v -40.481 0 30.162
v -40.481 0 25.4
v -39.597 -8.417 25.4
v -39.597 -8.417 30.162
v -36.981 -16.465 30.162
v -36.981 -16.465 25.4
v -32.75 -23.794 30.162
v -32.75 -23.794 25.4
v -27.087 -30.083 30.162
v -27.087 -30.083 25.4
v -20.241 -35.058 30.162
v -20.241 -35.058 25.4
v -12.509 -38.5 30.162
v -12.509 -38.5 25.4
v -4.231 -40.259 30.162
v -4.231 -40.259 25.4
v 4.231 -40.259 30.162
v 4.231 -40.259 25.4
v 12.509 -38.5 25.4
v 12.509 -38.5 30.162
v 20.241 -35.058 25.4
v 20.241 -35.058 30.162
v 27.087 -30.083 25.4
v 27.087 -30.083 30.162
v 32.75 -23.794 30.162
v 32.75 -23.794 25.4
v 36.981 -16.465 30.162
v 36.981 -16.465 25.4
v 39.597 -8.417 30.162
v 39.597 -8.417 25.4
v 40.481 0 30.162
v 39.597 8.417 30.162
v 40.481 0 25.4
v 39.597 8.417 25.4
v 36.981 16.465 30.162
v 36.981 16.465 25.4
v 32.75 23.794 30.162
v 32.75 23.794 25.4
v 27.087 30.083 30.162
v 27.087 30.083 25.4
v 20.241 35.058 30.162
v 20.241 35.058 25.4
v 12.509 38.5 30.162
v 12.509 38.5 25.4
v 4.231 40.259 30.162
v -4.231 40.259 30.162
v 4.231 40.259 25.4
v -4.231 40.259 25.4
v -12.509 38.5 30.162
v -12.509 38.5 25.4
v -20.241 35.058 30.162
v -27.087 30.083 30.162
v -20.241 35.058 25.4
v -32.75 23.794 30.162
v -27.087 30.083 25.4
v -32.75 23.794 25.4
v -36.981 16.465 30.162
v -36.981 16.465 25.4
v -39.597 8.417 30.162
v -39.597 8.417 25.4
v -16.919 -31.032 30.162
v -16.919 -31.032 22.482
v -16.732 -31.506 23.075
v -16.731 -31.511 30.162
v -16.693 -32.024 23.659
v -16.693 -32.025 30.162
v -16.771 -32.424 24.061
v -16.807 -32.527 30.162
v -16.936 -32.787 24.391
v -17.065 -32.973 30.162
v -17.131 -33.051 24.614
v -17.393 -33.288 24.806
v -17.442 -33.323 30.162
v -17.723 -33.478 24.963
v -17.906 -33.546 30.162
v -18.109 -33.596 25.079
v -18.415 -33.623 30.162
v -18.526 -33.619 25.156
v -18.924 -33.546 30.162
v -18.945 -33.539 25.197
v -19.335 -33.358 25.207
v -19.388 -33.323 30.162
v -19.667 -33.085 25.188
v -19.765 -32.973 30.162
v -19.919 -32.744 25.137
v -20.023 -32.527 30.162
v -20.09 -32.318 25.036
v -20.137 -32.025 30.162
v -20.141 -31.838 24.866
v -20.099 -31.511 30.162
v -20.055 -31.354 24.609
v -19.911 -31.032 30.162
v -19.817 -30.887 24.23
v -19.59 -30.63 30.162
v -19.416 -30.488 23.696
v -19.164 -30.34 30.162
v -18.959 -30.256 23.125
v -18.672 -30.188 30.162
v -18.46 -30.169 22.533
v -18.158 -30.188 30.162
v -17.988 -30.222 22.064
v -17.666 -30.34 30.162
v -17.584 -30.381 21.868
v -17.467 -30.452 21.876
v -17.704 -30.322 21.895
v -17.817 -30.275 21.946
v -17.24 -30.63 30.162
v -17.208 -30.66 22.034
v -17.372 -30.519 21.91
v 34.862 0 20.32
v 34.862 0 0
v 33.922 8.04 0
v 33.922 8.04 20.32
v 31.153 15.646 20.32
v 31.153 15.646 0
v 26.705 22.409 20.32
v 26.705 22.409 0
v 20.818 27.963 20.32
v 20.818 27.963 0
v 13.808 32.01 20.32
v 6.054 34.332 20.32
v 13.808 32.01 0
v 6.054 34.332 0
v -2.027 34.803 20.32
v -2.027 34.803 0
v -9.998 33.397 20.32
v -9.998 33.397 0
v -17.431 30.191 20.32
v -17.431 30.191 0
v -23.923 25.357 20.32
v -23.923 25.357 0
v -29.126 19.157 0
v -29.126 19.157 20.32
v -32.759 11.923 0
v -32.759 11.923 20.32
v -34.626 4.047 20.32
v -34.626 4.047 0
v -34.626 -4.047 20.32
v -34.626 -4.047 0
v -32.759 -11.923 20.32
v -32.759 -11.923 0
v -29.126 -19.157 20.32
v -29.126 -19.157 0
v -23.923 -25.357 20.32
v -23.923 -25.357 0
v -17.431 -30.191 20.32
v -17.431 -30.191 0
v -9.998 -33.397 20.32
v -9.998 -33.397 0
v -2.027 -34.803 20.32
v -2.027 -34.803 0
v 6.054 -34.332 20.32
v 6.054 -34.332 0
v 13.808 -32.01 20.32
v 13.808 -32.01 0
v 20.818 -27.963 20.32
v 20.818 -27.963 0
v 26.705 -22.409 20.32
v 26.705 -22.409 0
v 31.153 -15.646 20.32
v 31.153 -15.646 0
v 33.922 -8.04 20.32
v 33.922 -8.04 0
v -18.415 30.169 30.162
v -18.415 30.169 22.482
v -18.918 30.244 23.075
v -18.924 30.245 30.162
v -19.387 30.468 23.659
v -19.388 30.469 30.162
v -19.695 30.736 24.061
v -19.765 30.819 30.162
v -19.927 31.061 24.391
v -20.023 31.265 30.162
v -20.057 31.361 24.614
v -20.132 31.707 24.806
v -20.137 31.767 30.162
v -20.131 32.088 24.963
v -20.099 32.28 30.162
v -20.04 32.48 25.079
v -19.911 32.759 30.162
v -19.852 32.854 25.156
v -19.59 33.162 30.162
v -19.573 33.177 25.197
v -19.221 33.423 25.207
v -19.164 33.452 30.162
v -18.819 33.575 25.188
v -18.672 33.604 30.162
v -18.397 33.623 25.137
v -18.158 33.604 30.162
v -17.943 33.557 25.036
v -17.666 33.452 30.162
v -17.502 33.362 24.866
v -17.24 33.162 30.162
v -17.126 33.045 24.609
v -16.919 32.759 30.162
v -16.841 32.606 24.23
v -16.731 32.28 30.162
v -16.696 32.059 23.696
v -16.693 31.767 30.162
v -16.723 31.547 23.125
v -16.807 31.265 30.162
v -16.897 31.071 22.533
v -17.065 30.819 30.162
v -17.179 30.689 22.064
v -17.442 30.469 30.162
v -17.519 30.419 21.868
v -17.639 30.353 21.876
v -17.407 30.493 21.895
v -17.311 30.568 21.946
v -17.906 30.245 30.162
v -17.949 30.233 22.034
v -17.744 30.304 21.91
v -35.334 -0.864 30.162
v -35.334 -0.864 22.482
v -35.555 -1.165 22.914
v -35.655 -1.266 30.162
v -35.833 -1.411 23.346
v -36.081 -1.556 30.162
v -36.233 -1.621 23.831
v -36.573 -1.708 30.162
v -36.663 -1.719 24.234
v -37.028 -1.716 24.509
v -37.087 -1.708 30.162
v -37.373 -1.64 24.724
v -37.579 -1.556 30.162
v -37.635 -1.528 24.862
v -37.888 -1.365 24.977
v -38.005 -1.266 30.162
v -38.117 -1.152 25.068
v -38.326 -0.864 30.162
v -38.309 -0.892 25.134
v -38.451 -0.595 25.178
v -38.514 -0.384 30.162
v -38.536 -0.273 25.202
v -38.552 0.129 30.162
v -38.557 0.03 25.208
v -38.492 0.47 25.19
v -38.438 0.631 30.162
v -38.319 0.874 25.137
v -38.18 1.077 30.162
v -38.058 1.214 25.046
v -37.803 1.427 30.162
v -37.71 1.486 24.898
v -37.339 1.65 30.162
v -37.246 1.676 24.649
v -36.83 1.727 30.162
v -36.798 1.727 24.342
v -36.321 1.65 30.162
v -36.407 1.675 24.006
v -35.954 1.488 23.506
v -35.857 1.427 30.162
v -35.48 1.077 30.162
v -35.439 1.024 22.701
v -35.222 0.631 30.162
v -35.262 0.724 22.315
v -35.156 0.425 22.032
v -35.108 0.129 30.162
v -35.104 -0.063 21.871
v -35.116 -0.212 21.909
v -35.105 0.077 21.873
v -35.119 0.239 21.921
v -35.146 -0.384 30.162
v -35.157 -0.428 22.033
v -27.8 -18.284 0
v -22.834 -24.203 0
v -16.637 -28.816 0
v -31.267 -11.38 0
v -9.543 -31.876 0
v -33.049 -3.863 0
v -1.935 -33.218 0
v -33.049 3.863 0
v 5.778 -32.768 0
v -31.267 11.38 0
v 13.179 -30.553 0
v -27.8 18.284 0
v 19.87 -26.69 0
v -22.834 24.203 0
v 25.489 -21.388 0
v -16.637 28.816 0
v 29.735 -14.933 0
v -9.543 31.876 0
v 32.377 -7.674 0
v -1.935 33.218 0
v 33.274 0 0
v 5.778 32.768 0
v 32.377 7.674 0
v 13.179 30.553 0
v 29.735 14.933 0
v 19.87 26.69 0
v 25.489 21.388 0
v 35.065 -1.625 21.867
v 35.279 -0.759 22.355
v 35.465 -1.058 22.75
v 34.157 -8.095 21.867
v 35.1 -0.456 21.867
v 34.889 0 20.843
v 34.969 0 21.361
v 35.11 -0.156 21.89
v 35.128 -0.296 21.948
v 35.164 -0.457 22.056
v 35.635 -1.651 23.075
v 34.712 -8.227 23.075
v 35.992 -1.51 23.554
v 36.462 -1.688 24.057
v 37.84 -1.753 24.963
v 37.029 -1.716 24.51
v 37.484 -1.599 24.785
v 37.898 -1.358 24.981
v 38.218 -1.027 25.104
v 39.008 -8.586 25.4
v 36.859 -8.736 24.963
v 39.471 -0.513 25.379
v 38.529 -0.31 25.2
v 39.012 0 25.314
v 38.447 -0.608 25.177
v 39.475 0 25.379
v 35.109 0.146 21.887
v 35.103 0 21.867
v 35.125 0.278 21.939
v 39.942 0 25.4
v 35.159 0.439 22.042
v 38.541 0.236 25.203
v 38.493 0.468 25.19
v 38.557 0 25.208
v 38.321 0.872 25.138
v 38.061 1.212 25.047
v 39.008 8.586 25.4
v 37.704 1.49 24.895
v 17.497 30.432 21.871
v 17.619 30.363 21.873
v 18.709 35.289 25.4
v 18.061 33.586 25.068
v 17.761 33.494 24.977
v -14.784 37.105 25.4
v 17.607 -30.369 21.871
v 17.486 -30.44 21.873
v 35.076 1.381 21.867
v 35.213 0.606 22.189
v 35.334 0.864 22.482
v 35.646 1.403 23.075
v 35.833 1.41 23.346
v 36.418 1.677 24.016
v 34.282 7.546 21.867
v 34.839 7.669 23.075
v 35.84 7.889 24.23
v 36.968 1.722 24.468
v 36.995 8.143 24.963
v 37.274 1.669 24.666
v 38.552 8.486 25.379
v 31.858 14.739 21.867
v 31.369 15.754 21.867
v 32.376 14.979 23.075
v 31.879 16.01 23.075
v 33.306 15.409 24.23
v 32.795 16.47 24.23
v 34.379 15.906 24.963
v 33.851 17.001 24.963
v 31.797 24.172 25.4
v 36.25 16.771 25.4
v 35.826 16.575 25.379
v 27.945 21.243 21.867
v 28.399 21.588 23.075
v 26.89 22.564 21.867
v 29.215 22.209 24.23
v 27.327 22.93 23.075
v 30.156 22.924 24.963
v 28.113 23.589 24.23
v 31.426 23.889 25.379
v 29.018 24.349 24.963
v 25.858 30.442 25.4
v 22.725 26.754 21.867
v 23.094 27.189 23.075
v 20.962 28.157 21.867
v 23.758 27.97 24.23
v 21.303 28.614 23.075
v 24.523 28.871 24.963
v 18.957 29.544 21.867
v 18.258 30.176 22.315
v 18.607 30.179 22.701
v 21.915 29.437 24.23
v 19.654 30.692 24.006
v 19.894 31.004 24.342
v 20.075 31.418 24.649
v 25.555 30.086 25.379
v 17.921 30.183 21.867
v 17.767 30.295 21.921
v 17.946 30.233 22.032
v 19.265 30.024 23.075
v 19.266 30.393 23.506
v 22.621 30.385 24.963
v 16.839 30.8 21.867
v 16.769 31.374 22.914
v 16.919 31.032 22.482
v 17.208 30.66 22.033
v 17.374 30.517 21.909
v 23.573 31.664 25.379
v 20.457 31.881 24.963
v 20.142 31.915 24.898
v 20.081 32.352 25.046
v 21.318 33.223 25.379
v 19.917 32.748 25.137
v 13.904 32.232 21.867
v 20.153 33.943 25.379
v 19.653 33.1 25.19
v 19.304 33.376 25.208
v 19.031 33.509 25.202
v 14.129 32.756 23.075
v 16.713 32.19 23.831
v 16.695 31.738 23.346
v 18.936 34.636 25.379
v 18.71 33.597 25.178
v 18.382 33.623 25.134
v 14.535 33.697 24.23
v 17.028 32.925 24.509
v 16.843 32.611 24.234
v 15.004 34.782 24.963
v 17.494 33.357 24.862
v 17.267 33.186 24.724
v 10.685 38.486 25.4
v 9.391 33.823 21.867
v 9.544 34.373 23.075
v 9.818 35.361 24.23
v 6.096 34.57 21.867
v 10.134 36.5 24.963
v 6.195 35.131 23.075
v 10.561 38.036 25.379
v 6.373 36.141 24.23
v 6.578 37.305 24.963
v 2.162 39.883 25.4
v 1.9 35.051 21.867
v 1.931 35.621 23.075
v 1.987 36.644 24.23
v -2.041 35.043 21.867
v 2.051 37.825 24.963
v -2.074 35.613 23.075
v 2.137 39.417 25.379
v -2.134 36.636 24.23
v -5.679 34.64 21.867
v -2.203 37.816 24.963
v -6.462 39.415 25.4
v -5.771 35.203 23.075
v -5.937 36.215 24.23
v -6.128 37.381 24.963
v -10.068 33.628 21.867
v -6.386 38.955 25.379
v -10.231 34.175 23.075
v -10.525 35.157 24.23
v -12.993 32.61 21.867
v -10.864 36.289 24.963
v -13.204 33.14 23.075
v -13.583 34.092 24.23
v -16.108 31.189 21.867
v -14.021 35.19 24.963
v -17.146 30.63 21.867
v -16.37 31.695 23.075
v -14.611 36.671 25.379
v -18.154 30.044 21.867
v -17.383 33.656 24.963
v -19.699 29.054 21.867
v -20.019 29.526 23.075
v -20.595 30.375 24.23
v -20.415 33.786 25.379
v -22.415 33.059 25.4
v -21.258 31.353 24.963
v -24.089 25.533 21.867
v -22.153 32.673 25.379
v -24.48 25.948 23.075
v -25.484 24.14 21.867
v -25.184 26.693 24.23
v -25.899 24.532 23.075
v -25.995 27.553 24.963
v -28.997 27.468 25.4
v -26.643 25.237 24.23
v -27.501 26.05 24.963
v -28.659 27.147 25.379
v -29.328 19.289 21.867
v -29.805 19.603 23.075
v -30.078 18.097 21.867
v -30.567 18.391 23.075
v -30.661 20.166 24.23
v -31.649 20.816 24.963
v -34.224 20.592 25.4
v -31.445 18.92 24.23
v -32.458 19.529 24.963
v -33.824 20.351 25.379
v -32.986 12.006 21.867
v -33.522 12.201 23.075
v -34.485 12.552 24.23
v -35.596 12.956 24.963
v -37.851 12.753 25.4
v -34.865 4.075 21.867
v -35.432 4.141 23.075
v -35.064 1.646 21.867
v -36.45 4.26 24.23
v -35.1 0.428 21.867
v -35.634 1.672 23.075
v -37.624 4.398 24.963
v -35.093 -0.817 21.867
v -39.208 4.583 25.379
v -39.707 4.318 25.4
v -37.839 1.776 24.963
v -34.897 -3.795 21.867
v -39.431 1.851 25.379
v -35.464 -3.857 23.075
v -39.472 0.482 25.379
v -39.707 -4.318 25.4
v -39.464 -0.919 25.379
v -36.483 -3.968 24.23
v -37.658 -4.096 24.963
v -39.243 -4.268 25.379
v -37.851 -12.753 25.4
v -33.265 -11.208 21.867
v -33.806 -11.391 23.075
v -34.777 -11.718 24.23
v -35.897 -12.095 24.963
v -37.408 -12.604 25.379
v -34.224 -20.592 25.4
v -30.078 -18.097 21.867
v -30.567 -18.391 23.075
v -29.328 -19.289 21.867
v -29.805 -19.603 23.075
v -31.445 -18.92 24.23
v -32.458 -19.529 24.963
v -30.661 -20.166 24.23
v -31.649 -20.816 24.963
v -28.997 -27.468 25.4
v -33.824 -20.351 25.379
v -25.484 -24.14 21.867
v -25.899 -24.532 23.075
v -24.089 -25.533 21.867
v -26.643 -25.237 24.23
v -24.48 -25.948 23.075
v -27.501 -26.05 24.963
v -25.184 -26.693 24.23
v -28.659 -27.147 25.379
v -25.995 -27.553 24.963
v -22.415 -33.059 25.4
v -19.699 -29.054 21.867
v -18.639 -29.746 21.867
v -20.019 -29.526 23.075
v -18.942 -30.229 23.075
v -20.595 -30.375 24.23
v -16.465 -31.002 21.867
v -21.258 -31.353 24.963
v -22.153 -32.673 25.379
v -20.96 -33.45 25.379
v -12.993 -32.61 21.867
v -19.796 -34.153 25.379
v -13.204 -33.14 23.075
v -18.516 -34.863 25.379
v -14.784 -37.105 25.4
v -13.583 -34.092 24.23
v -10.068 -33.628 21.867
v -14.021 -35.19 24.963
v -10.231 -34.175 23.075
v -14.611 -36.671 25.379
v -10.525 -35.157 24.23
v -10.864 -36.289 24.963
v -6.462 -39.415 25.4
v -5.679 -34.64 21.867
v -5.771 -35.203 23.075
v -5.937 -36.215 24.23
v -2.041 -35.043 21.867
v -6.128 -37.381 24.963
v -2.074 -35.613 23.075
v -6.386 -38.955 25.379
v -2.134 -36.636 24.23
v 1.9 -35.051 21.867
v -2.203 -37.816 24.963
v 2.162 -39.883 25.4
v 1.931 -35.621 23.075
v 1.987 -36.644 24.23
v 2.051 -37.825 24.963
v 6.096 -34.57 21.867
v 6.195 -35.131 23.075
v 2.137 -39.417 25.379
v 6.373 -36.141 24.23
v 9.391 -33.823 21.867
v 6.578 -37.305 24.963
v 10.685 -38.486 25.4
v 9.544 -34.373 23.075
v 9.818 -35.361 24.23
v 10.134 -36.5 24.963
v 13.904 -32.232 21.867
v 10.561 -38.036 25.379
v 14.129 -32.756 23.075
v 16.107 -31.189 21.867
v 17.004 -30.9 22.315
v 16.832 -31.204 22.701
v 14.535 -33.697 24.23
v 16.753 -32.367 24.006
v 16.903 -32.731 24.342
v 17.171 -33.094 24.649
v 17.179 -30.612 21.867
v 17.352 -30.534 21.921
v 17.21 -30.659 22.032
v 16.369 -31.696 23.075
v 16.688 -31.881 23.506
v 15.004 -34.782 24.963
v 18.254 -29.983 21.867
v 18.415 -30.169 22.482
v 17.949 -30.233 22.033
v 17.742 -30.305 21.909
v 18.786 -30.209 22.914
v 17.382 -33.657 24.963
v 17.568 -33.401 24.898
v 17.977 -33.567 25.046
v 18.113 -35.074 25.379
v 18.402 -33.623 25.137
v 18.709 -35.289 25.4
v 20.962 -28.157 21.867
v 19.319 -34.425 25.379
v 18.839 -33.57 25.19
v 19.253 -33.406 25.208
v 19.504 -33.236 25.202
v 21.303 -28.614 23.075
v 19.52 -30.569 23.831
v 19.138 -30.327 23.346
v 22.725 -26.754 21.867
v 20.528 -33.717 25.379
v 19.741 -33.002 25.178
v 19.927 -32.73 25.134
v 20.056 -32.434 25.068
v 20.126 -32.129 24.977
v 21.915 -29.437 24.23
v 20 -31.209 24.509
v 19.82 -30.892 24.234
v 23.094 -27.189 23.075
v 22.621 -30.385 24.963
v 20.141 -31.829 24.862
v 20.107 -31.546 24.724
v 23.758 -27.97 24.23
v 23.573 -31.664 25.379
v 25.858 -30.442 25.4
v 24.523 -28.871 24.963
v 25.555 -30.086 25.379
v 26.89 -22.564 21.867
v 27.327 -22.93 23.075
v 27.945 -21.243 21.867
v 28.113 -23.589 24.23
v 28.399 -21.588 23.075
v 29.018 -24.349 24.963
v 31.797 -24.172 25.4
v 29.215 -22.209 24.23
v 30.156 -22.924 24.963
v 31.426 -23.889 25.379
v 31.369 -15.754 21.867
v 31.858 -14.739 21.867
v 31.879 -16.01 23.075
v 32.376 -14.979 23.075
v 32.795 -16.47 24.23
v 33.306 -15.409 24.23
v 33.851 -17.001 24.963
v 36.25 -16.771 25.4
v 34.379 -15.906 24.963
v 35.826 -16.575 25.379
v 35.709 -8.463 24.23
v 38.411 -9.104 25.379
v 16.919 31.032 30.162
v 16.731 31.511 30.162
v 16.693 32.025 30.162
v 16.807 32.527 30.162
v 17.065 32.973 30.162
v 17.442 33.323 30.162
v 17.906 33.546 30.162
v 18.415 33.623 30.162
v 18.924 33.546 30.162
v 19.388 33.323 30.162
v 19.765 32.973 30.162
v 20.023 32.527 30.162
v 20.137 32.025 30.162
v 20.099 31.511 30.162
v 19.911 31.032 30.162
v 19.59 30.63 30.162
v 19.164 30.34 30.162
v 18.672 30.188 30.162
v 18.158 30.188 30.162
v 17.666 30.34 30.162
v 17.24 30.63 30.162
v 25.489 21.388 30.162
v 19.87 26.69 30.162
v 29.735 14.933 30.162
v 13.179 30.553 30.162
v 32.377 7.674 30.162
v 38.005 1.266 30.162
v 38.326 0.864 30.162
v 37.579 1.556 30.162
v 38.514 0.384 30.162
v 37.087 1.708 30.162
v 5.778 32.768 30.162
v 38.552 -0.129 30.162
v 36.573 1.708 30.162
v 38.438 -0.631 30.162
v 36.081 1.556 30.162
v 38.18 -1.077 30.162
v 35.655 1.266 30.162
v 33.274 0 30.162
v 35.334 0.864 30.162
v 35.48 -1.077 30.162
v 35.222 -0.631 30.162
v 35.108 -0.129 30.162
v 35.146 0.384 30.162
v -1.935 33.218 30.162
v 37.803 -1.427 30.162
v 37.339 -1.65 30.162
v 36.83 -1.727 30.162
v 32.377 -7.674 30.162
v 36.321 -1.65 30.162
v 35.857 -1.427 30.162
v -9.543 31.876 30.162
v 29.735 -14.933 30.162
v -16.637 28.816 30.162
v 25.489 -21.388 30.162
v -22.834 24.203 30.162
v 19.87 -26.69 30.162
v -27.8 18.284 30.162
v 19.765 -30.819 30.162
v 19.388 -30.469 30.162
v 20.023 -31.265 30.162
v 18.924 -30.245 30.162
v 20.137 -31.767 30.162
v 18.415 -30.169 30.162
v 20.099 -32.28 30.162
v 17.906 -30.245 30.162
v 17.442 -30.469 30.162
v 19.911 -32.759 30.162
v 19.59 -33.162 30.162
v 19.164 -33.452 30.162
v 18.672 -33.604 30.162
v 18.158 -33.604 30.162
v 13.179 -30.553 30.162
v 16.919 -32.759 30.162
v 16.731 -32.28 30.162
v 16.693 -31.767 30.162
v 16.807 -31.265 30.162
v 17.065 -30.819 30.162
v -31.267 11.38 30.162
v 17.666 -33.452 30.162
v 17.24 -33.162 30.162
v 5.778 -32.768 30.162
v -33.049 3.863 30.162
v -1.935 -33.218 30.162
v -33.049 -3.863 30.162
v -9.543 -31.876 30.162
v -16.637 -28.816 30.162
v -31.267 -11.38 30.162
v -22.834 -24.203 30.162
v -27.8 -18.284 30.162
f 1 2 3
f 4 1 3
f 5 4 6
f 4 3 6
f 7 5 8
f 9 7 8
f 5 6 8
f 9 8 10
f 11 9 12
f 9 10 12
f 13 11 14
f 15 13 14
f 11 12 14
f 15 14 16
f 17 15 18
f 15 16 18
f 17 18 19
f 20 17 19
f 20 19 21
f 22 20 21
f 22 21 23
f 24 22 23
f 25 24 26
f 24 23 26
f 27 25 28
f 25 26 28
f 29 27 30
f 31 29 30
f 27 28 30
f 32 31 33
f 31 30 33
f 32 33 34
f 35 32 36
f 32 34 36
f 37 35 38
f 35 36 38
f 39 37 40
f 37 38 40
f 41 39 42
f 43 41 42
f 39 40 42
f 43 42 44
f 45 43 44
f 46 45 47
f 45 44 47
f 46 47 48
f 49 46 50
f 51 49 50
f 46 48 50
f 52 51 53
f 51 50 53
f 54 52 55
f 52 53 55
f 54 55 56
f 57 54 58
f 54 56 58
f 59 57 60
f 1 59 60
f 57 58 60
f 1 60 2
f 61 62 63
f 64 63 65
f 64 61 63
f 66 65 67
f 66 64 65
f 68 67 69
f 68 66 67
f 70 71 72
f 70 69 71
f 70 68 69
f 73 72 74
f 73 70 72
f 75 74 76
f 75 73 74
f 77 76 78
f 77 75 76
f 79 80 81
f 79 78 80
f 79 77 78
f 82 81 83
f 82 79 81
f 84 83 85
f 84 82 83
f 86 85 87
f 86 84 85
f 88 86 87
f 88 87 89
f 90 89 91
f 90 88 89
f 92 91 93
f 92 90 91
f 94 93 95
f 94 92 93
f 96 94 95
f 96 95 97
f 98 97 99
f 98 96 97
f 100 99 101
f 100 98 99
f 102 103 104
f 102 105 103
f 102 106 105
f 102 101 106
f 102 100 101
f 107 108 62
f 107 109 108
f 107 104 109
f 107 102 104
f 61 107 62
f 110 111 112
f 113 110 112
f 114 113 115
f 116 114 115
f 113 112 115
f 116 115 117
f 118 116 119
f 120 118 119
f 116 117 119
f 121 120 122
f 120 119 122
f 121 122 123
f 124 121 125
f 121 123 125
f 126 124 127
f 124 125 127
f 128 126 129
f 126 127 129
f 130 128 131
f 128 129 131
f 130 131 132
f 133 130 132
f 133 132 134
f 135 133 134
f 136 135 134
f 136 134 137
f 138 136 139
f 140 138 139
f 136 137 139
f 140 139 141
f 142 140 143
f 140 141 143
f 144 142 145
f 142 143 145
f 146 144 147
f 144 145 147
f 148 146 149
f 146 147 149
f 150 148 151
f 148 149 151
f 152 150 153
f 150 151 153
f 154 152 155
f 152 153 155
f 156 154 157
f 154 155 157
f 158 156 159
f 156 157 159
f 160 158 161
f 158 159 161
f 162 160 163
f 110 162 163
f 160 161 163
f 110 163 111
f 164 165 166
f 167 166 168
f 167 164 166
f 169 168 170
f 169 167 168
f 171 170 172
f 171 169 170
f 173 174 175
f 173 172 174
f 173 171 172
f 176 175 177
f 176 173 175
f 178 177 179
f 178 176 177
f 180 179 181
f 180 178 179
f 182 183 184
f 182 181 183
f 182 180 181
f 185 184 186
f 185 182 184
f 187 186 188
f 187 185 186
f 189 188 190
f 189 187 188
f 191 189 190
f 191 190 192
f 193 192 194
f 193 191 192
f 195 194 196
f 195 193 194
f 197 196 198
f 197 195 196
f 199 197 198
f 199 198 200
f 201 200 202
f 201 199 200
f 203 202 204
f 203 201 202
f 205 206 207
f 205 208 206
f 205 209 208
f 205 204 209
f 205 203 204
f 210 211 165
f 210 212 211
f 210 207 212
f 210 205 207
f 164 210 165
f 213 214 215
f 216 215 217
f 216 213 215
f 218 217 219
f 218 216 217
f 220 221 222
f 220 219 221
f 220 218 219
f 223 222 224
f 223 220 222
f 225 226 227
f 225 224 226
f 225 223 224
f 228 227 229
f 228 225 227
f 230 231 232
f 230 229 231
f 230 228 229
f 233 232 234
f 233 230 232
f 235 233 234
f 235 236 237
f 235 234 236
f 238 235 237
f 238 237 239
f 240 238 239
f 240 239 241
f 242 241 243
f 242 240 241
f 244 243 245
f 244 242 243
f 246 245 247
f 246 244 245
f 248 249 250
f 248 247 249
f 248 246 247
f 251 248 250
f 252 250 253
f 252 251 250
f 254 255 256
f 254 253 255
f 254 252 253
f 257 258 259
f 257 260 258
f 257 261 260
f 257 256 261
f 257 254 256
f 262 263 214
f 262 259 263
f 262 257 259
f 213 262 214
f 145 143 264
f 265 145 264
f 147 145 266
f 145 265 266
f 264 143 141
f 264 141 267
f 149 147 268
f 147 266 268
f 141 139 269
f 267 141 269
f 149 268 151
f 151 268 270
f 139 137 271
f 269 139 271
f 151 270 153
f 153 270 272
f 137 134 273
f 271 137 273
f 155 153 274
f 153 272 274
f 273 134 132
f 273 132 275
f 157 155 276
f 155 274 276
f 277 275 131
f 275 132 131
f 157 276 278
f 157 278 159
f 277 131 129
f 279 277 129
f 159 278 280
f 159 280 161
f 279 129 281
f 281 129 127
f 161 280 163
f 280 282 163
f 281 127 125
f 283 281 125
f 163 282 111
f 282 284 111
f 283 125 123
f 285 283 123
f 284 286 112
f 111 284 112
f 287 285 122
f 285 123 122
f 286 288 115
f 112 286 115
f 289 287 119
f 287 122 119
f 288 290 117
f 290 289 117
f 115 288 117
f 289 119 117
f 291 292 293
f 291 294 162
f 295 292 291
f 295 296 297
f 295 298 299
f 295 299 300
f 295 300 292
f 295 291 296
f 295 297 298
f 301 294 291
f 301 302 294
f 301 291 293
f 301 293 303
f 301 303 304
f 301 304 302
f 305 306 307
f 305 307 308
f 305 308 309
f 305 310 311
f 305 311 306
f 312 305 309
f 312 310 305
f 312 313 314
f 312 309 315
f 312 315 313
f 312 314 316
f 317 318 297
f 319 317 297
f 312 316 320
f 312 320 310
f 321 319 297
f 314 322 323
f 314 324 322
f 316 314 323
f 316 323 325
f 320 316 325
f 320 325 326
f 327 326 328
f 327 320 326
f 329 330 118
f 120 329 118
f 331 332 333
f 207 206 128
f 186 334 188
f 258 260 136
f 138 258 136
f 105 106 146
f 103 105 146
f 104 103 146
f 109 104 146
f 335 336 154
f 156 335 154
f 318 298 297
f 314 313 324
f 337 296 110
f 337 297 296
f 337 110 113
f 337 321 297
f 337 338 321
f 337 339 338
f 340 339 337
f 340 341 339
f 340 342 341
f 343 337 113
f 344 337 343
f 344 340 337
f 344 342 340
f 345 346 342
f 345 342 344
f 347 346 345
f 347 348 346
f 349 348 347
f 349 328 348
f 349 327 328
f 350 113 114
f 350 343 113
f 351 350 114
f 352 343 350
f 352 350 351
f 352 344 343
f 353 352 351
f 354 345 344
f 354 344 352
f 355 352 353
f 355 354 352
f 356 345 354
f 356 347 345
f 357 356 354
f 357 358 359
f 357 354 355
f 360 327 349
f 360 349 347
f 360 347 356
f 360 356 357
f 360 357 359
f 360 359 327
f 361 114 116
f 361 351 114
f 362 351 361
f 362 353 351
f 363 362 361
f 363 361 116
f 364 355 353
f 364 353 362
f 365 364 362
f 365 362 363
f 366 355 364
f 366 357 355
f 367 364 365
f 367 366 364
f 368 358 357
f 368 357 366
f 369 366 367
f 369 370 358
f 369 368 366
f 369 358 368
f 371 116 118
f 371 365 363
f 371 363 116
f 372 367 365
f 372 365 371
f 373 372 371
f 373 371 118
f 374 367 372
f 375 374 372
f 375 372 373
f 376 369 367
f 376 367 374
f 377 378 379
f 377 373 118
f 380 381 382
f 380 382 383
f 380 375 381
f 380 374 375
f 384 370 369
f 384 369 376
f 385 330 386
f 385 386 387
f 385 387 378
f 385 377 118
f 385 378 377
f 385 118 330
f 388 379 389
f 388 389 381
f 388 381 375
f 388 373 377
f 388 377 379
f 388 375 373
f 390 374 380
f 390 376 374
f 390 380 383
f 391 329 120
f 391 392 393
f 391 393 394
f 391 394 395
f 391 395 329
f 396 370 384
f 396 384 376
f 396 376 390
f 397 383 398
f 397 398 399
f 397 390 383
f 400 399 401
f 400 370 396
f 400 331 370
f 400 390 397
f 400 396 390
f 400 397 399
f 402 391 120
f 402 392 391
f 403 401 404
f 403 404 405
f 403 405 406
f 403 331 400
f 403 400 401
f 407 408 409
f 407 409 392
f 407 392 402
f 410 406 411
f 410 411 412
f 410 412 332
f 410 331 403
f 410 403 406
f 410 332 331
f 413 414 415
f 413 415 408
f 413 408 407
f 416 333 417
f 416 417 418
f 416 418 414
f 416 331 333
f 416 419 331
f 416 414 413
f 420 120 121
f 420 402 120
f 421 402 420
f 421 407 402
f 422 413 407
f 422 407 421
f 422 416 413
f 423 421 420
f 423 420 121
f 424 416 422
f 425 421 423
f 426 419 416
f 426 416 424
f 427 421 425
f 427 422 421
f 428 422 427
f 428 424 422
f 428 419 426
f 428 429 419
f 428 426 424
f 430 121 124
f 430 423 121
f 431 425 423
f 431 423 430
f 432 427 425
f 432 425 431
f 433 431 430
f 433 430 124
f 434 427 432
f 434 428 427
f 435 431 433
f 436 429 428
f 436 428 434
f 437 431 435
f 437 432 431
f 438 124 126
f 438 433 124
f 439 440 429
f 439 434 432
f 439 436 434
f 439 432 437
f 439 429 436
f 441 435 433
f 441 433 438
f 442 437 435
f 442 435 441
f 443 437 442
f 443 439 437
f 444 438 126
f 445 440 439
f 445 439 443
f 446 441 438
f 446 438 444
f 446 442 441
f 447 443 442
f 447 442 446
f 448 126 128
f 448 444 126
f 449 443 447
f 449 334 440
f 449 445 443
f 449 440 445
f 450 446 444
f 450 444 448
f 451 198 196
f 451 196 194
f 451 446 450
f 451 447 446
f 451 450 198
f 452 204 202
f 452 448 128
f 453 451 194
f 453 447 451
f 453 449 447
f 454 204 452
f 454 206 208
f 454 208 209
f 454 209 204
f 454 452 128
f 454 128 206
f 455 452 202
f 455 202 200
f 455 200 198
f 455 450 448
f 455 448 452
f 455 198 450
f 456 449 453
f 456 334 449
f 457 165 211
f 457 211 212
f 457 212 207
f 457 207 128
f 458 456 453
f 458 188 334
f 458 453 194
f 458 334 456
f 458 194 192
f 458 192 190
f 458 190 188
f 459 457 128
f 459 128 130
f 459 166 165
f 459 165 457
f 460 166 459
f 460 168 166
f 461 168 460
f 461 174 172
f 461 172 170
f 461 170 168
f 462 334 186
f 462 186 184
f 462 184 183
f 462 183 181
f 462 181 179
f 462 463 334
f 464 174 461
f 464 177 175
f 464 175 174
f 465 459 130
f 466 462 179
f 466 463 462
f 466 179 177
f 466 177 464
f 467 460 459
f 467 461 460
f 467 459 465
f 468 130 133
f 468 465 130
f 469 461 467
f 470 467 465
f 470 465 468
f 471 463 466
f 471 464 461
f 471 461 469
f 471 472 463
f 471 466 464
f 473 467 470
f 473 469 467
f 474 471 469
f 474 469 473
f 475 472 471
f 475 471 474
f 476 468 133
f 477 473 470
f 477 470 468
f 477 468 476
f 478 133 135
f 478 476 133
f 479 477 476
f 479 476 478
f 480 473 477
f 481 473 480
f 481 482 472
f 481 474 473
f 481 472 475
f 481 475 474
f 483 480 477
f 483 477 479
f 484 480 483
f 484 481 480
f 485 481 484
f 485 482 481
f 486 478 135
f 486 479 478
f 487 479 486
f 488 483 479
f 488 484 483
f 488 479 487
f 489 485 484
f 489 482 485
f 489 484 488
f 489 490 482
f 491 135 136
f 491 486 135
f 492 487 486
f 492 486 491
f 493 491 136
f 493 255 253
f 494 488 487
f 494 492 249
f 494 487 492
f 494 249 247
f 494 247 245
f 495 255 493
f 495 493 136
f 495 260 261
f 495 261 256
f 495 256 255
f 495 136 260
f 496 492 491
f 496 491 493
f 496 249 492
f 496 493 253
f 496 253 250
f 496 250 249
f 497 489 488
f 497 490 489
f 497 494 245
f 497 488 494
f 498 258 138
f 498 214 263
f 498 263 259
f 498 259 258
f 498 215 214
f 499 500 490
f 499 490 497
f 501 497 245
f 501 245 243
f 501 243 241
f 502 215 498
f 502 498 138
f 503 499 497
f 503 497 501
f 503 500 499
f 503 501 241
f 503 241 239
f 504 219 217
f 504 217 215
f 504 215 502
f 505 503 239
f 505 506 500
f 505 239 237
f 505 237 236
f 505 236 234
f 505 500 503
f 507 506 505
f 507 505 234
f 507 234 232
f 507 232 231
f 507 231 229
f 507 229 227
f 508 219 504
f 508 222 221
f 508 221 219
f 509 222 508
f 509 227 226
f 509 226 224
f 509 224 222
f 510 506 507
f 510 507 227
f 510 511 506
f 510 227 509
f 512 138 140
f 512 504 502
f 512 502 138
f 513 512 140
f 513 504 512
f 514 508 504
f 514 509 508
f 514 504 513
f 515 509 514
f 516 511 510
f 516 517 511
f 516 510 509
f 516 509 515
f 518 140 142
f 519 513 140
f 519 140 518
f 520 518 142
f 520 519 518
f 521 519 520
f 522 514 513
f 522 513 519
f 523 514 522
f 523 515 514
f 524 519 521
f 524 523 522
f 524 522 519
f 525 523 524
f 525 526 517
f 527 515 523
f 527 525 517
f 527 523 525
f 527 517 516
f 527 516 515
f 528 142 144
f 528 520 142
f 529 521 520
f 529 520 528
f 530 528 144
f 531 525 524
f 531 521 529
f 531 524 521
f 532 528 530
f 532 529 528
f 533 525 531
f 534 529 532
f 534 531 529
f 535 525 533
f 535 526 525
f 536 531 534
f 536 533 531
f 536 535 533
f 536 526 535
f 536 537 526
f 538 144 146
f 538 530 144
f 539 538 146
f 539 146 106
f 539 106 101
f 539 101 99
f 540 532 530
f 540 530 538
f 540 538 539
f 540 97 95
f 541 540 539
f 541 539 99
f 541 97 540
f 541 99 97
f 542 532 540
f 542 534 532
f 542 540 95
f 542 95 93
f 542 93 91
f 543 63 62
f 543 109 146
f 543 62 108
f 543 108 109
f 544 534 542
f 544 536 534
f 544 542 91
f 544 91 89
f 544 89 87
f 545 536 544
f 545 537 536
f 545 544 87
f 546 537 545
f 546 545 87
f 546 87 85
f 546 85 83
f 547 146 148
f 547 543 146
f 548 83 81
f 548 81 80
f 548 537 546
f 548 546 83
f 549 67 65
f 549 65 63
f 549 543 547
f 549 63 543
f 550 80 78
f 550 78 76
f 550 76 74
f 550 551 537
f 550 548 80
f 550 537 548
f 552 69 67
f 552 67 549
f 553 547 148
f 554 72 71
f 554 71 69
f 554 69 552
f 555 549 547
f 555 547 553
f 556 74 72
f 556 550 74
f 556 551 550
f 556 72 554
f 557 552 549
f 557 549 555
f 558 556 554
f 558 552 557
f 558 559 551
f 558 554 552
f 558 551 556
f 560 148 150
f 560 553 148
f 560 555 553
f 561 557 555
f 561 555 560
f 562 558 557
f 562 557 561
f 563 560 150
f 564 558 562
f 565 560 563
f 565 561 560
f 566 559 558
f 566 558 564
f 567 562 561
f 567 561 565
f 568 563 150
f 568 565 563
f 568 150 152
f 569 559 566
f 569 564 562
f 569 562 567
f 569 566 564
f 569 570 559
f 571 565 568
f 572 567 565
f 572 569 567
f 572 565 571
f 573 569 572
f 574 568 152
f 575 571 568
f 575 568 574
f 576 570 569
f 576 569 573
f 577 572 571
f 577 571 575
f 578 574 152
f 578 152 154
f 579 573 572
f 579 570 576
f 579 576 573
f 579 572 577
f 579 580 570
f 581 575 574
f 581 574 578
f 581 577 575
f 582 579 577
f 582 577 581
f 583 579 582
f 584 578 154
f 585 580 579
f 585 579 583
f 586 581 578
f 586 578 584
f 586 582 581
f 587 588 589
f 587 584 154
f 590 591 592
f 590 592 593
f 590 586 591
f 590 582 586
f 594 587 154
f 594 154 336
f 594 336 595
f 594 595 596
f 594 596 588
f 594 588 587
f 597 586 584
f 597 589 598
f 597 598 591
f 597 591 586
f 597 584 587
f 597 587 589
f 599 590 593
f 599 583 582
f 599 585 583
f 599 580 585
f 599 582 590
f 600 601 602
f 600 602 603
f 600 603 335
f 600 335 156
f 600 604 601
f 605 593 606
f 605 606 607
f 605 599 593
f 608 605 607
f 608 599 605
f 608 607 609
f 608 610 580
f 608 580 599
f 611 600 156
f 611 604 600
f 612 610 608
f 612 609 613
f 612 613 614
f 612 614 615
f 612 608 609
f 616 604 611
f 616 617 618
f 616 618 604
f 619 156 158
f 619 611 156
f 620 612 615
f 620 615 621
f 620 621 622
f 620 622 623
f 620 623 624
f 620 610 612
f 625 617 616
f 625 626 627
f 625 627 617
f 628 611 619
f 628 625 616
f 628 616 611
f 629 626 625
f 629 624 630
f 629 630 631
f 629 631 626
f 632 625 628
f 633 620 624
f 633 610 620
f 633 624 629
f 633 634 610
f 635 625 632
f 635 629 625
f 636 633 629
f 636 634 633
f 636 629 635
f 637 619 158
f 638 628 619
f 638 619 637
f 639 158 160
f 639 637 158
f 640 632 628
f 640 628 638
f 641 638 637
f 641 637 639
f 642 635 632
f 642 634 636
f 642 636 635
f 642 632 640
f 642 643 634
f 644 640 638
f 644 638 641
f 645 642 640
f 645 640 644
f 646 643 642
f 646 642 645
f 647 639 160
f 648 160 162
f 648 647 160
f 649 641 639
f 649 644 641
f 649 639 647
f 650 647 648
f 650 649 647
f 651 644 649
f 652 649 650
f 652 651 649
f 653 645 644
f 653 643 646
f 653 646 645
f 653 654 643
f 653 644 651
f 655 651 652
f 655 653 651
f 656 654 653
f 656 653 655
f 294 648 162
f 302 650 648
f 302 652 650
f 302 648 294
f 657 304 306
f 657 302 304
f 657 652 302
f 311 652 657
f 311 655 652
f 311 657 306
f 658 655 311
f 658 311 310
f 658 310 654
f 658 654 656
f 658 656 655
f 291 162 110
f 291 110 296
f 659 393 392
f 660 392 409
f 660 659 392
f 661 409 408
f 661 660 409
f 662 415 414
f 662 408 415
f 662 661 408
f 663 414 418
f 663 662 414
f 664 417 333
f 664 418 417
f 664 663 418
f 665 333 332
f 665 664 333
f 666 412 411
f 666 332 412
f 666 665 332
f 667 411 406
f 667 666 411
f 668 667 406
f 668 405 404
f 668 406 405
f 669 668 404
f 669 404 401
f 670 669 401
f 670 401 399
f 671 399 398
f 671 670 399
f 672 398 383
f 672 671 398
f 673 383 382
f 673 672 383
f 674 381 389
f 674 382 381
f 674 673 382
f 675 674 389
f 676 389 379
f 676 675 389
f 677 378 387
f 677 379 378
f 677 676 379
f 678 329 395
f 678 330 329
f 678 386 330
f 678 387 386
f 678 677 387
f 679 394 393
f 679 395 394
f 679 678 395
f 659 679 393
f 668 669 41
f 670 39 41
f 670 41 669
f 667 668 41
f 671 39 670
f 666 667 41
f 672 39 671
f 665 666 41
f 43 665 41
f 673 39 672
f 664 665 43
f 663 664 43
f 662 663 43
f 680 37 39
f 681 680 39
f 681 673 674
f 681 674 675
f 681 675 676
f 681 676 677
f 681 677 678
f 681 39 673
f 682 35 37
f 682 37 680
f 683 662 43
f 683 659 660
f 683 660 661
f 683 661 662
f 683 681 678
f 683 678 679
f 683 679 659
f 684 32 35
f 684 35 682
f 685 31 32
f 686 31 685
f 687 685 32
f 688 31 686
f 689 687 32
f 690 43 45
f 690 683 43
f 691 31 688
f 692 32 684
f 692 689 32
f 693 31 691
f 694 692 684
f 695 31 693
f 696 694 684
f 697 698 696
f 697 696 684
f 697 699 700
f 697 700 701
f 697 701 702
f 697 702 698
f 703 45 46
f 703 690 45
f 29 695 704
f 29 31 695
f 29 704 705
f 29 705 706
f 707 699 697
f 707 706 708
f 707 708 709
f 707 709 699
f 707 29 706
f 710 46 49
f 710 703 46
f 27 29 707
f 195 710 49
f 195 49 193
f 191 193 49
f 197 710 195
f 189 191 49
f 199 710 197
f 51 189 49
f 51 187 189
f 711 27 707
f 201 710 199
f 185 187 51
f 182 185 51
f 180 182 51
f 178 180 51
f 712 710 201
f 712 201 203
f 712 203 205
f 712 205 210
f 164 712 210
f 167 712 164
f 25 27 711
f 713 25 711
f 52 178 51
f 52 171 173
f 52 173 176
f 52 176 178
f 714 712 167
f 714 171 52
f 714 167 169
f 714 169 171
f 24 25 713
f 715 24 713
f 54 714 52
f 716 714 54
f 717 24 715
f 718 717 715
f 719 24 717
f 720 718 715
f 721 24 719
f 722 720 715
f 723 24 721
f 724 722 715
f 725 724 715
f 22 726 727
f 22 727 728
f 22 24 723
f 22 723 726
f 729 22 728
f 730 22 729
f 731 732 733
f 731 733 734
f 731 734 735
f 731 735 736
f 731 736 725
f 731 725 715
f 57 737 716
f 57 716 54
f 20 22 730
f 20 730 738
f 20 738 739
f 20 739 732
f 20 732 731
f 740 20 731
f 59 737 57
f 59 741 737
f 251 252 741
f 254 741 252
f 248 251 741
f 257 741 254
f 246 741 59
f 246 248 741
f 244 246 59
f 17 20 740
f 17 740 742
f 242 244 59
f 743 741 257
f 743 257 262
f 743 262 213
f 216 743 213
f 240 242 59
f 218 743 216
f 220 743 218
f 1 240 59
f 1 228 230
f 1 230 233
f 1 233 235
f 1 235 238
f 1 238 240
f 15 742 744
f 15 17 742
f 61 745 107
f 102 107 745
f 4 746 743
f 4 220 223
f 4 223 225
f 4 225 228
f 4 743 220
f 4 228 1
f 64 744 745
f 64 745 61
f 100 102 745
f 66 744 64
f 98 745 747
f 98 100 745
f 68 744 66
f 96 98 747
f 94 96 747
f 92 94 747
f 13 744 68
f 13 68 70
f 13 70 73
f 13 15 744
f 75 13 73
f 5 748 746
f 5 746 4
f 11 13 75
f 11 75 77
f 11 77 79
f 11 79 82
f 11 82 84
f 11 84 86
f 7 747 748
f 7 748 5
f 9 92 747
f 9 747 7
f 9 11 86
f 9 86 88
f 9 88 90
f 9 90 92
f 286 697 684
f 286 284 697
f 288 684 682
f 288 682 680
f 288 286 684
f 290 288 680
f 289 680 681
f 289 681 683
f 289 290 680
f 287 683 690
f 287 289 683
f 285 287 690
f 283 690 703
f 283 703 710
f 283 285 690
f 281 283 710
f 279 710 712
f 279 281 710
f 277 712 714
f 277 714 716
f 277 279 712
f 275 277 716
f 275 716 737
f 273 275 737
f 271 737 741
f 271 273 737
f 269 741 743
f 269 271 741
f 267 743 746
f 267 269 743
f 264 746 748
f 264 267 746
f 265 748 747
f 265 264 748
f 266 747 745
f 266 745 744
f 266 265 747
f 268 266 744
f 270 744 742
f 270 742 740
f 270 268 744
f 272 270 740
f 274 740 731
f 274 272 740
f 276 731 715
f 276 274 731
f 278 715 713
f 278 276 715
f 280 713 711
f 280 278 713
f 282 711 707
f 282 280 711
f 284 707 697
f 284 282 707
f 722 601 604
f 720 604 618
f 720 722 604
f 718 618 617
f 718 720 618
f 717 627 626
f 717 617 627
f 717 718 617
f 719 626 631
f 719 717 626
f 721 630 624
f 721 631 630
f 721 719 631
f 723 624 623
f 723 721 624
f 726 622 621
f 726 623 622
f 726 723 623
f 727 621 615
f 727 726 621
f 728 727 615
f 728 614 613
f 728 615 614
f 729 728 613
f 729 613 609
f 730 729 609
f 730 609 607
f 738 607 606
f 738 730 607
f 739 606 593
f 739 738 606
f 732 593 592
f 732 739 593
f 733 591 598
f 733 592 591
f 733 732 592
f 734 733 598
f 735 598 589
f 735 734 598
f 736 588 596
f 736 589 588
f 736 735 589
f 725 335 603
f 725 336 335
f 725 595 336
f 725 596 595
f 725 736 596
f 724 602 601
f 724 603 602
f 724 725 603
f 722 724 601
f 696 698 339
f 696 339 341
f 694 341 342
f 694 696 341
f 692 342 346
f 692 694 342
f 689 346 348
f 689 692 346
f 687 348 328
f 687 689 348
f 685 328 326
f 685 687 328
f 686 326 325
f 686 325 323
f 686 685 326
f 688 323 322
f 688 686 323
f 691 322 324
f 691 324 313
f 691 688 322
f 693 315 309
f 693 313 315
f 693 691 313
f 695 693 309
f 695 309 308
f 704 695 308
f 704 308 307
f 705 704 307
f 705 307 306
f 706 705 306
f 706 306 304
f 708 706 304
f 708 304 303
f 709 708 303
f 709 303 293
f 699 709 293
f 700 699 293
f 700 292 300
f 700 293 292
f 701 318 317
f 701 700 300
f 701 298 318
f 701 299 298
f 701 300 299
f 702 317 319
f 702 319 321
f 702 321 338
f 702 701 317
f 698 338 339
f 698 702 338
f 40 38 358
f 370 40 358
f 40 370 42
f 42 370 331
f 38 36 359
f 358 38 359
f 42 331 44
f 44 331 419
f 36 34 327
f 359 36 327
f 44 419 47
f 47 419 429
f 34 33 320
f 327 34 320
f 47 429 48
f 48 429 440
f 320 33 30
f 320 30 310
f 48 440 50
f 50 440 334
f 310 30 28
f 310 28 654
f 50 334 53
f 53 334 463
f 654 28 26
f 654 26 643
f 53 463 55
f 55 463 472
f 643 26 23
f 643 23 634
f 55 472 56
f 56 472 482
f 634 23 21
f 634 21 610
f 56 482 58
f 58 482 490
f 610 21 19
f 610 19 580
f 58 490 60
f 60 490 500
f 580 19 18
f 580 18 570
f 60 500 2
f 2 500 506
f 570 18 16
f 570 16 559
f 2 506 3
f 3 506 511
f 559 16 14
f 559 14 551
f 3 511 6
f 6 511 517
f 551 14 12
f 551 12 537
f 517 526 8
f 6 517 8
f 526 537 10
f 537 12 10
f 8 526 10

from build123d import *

# Parameters (mm, degrees)
SKETCH1_R           = 34.8615
SKETCH1_R_2         = 33.274
BOSS_EXTRUDE1_DEPTH = 25.4
SKETCH2_R           = 40.48125
SKETCH2_R_2         = 33.274
BOSS_EXTRUDE2_DEPTH = 4.7625
FILLET1_R           = 5.08
CIRPATTERN1_COUNT   = 6


with BuildPart() as part:
    # Sketch1 → Boss-Extrude1 (new body)
    with BuildSketch(Plane.XY):
        Circle(SKETCH1_R)
        Circle(SKETCH1_R_2, mode=Mode.SUBTRACT)
    extrude(amount=BOSS_EXTRUDE1_DEPTH)

    # Sketch2 → Boss-Extrude2 (add)
    with BuildSketch(Plane.XY.offset(25.4)):
        with Locations(Location((0, 0, 0), (0, 0, 180))):
            Circle(SKETCH2_R)
        Circle(SKETCH2_R_2, mode=Mode.SUBTRACT)
    extrude(amount=BOSS_EXTRUDE2_DEPTH)

    # Fillet1
    fillet1_edges = [part.edges().sort_by_distance(p)[0] for p in [
        (-34.8615, 0, 25.4),
    ]]
    fillet(fillet1_edges, radius=FILLET1_R)

    # Sketch7 → #8-32 Tapped Hole1 (revolve, cut)
    with BuildSketch(Plane(origin=(-18.415, 31.895715621, 30.1625), x_dir=(0, -1, 0), z_dir=(1, 0, 0))):
        Polygon((0, 0), (0, 11.705806461), (1.7272, 10.668), (1.7272, 0), align=None)
    f_8_32_tapped_hole1 = revolve(axis=Axis((-18.415, 31.895715621, 36.5125), (0, 0, -1)), mode=Mode.SUBTRACT)

    # CirPattern1: #8-32 Tapped Hole1 ×6 about axis
    cirpattern1_axis = Axis((0, 0, 0), (0, 0, 1))
    for i in range(1, CIRPATTERN1_COUNT):
        add(f_8_32_tapped_hole1.rotate(cirpattern1_axis, i * 360 / CIRPATTERN1_COUNT), mode=Mode.SUBTRACT)


solid = part.part
